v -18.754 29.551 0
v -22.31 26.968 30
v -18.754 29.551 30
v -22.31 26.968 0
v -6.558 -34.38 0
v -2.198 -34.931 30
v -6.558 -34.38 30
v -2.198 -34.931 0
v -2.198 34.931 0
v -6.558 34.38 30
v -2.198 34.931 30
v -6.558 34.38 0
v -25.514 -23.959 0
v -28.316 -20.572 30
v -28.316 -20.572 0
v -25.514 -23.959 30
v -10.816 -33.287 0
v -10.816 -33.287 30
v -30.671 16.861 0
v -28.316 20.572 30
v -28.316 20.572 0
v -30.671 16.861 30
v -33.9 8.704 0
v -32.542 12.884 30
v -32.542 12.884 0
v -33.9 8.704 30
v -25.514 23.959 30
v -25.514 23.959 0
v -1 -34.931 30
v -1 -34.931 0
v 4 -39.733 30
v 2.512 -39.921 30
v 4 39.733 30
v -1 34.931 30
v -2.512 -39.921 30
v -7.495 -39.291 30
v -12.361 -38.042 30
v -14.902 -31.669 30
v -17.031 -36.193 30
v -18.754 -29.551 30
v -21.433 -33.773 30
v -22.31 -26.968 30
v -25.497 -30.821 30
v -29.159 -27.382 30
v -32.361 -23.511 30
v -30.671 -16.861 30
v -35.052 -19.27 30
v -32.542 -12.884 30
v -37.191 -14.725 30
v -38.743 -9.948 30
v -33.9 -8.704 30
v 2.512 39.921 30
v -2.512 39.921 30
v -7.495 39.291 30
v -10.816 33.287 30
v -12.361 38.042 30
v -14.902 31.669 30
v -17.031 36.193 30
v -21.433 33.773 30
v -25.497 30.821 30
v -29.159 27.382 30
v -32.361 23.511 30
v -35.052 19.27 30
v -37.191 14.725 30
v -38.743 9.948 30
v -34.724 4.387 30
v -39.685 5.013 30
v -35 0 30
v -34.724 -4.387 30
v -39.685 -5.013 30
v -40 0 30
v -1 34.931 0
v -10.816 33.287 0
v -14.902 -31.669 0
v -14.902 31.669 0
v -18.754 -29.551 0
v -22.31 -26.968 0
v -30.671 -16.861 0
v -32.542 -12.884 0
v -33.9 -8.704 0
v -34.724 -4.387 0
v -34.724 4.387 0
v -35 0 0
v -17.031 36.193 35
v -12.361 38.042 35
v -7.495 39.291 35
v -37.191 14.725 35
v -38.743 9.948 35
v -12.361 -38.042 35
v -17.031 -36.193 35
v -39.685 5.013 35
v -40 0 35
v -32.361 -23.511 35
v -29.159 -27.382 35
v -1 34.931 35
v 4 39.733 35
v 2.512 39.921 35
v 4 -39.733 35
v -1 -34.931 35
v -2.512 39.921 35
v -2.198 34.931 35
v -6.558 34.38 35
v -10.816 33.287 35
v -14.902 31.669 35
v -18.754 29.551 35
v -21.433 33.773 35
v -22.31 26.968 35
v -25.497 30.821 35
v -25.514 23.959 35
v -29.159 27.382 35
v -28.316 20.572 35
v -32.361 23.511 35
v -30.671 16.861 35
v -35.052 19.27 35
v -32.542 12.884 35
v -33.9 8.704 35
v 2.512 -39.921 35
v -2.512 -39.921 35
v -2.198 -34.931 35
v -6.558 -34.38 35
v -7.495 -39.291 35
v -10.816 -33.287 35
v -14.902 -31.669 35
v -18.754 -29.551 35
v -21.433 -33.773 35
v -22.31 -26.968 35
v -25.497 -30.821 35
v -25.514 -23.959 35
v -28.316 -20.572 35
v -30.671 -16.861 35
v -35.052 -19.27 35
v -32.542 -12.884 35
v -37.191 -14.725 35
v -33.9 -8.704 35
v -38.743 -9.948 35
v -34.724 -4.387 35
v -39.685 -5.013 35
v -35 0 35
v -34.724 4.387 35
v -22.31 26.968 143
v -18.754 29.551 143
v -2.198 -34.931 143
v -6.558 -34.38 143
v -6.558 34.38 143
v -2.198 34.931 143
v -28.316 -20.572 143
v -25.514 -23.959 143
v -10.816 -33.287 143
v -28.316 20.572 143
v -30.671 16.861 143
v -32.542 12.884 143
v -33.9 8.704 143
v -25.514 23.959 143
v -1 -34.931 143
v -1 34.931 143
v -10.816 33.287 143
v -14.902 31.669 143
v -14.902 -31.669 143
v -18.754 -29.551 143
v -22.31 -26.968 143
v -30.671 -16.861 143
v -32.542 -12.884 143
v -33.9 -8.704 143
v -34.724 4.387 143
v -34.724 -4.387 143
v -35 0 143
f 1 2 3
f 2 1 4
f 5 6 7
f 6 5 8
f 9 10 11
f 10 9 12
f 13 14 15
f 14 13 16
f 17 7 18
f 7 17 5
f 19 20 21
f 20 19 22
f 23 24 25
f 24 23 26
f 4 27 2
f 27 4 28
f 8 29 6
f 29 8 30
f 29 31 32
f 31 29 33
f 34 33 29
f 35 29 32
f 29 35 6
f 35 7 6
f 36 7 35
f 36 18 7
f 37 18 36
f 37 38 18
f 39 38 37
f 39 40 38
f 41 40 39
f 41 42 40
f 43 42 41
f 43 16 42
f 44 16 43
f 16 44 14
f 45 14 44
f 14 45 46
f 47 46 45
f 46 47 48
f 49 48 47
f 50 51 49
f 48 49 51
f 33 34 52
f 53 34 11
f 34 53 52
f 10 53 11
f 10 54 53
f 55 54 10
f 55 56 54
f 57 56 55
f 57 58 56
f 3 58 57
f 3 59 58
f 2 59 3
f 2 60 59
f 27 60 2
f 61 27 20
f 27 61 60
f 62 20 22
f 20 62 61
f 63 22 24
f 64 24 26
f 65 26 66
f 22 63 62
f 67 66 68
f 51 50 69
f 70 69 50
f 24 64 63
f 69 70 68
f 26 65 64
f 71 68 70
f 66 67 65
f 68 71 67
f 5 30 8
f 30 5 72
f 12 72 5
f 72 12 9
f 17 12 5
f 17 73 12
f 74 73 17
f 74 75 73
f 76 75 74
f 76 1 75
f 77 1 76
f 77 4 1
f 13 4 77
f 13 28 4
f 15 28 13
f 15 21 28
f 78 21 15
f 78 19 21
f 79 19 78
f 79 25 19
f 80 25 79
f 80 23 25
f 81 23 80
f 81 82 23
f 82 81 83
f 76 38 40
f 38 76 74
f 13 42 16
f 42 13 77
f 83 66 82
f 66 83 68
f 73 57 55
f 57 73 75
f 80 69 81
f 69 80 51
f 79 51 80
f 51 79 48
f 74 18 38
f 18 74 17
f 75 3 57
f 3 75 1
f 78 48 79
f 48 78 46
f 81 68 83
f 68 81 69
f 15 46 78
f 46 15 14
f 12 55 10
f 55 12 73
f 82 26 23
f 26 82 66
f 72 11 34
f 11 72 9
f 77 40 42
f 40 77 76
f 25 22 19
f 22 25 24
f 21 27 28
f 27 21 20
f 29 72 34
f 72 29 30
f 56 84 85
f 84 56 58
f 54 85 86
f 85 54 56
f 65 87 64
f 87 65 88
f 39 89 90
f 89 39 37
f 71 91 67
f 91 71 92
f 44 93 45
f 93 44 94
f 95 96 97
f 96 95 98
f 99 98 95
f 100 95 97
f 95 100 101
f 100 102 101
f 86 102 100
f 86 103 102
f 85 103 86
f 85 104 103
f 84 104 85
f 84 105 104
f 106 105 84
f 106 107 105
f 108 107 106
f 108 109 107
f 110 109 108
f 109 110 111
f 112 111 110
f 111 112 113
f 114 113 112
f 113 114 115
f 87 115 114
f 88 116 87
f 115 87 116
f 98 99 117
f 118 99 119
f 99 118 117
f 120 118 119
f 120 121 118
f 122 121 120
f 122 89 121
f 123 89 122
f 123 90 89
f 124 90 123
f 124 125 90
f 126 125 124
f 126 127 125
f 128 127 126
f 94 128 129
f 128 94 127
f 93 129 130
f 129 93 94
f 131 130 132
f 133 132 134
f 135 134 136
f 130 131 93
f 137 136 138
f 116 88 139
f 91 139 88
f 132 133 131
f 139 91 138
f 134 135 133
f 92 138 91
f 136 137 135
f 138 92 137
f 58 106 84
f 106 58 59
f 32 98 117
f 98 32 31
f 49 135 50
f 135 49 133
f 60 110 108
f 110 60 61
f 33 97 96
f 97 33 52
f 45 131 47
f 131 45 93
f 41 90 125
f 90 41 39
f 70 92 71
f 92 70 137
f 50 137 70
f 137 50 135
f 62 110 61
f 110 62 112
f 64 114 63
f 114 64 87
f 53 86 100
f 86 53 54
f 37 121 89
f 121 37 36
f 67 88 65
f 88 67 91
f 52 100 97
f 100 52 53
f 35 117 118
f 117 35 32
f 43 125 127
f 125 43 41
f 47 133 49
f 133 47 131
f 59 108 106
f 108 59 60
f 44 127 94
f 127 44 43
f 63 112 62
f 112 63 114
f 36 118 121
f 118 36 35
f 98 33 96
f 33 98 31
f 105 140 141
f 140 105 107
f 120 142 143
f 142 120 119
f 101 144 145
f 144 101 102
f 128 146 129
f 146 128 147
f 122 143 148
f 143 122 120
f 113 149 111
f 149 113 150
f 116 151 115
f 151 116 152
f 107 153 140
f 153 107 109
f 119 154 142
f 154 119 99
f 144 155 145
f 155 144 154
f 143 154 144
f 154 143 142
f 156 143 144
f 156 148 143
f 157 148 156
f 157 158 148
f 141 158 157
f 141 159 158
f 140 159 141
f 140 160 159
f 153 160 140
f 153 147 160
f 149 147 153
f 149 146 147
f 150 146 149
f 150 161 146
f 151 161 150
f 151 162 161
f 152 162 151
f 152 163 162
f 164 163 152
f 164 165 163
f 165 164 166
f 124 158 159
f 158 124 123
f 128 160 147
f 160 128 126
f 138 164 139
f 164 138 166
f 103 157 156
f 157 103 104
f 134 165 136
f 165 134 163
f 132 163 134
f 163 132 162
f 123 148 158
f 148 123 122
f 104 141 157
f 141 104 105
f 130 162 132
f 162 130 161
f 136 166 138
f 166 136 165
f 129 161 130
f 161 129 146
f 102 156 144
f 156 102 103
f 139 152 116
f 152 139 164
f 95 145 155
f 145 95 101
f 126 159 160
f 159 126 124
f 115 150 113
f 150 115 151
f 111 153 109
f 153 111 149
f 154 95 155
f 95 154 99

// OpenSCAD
/*
 * Juicer Pusher for Waring JEX328
 * @model JEX328
 *
 * @author Ivan Mihov
 * @email ivan@imihov.com
 * @web imihov.com
 * @date 06/19/2018
 */

//=============================
//Render Variables
//=============================
$fn=50;

//=============================
//Part Variables in mm
//=============================
top_shaft_height = 54;
bottom_shaft_height = 15;
radius = 35;
cross_section_cut = 34;

ring_thickness = 5;
ring_diameter_offset = 5;

// Build the top section of the pusher
module topShaft() {
	translate([0,0,top_shaft_height+(2*bottom_shaft_height)+ring_thickness]) difference(){
		cylinder(r=radius, h=2*top_shaft_height,  center=true);
		translate([cross_section_cut,0,0])
            cube([radius*2,radius*2+ring_thickness,2*top_shaft_height+1], center=true);
	}
}

// Build the bottom section of the pusher
module bottomShaft() {
	translate([0,0,bottom_shaft_height]) difference(){
		cylinder(r=radius, h=2*bottom_shaft_height,  center=true);
		translate([cross_section_cut,0,0])
            cube([radius*2,radius*2+ring_thickness,2*bottom_shaft_height+1], center=true);
	}
}

// Build the ring (stopper) around the pusher
module ring() {
    translate([0,0,2*bottom_shaft_height+ring_thickness/2]) difference() {
        cylinder(r=(radius)+ring_diameter_offset, h=ring_thickness,  center=true);
        translate([cross_section_cut+ring_diameter_offset,0,0])
            cube([radius*2,(radius*2)+(ring_diameter_offset*2),ring_thickness+1], center=true);
    }
}

bottomShaft();
ring();
topShaft();
